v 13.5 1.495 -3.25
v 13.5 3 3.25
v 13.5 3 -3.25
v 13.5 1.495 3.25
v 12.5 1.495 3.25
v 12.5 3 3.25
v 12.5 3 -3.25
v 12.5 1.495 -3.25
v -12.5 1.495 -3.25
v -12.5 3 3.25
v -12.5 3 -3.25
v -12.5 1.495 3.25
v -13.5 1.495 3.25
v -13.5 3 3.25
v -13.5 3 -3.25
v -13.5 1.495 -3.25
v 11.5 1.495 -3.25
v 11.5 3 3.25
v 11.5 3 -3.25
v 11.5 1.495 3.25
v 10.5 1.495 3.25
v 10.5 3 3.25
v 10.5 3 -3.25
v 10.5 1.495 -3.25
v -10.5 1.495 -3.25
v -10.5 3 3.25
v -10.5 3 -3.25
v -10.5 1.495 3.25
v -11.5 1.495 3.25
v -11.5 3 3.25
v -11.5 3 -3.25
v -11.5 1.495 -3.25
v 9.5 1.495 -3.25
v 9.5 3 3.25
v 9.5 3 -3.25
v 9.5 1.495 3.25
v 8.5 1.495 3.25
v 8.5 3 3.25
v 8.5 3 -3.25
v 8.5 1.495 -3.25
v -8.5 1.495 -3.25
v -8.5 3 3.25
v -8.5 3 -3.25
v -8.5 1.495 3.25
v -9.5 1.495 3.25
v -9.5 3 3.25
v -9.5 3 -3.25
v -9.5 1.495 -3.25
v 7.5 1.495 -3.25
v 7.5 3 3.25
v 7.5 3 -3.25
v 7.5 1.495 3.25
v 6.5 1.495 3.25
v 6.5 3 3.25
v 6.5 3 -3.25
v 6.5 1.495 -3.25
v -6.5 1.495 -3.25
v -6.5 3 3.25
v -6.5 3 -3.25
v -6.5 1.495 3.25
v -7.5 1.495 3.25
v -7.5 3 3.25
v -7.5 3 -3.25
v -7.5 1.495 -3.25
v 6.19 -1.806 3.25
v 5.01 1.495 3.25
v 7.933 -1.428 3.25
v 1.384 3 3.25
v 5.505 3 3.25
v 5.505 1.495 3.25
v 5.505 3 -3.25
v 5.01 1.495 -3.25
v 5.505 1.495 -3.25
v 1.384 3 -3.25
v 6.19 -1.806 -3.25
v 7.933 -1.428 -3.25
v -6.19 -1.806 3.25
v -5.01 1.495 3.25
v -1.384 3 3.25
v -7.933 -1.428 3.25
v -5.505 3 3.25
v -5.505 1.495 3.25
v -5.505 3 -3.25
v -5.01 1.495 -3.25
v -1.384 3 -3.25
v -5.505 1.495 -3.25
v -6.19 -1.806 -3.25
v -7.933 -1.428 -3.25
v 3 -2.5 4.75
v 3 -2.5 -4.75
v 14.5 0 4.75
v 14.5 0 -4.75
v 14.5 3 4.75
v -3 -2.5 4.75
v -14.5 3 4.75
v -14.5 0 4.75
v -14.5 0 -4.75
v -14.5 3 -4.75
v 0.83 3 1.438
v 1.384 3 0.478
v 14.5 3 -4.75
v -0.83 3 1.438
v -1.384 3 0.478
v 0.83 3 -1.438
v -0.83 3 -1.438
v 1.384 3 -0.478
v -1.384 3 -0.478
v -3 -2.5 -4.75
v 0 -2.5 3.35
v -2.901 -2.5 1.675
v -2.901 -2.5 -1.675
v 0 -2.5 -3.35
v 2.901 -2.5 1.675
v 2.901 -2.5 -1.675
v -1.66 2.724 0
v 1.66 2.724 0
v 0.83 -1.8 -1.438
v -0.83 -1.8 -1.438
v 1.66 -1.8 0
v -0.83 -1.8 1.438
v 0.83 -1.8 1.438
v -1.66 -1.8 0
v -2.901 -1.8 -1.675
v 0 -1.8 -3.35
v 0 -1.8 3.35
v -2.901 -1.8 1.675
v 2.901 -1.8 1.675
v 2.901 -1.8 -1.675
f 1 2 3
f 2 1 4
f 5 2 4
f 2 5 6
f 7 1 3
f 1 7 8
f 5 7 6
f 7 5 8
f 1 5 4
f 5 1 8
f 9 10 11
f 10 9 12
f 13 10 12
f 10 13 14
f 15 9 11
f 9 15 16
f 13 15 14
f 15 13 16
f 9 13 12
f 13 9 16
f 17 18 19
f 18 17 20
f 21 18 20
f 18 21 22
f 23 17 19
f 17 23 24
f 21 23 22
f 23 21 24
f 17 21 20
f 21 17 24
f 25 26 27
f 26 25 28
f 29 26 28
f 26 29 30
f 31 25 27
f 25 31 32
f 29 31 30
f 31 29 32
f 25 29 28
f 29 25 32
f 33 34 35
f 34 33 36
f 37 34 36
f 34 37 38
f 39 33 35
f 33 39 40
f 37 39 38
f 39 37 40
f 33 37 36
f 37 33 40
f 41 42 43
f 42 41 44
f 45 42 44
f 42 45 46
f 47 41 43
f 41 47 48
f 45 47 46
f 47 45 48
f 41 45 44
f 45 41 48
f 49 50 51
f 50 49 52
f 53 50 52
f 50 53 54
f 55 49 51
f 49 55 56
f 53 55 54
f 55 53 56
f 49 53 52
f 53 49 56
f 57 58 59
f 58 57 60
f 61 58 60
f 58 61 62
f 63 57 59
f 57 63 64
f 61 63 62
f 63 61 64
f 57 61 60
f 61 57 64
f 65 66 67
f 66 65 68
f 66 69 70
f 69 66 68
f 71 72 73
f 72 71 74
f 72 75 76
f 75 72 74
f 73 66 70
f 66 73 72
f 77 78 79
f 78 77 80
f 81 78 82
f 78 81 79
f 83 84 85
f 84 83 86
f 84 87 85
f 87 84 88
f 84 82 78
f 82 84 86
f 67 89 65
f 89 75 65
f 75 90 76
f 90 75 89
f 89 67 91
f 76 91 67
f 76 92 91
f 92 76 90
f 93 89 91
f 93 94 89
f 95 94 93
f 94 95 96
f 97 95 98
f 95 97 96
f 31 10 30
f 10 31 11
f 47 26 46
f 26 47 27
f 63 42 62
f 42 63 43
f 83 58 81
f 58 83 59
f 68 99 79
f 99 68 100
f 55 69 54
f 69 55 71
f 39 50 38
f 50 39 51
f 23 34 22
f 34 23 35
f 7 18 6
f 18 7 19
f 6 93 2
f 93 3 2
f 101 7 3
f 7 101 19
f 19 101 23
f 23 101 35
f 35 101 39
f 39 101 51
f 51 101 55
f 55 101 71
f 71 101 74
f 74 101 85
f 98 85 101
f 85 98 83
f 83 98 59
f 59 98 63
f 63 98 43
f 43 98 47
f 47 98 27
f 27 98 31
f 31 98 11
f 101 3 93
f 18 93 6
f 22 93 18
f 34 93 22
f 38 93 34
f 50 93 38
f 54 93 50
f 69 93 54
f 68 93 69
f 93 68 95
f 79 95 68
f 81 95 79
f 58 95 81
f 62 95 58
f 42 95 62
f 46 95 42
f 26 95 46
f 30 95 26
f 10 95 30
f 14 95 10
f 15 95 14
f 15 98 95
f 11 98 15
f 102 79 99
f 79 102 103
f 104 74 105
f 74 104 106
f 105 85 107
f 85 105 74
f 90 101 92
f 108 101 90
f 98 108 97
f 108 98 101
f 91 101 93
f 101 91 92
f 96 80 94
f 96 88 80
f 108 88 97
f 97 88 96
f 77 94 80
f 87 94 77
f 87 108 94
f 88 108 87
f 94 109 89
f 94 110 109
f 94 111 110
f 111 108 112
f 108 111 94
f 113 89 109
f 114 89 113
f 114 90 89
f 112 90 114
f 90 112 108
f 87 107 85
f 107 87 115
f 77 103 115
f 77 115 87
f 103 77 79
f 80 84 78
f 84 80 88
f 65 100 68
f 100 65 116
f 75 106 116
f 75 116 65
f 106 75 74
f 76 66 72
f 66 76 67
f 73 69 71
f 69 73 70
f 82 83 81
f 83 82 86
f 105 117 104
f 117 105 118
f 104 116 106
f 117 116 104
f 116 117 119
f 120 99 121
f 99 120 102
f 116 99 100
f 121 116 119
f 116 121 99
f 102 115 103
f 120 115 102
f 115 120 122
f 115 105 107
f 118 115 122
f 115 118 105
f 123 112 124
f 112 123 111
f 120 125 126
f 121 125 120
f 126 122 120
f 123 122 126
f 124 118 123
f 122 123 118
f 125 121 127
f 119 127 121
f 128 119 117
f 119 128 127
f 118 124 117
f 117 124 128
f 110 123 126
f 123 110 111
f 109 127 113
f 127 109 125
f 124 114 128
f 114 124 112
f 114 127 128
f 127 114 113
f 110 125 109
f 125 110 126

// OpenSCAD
// Tough Belt Clip
// Design by Marius Gheorghescu, December 2013


// how many teeth on each side
teeth = 5;

// width of the belt in mm incl clearance (use 6.25 for typical GT2 belt)
belt_width = 6.5;

// thickness of the belt in mm (use 1.5 for GT2 belt)
belt_thickness = 1.5;

// belt pitch in mm (use 2.0 for GT2 belt)
pitch = 2.0;

// this controls the strength of the bracket 
shell = 1.5;

/* [Hidden] */
cutout_width = 6 + belt_thickness + shell;
len = 2*teeth*pitch + cutout_width;
round_corner_epsilon = 1;
epsilon = 0.01;


module belt()
{
	// reinforcement
	//cube([len, 2, h], center=true);

	for(i=[pitch/4:pitch:len]) {
		translate([i-len/2, 1.25, 0])
			cube([pitch - round_corner_epsilon, belt_thickness + round_corner_epsilon, belt_width], center=true);

	}

}



module clip() {
difference()  {

	union() {
		// general shape of the clip
		linear_extrude(belt_width + 2*shell, center=true) {
			polygon(points=[
				[len/2,0],
				[3,-2.5], 
				[-3,-2.5], 
				[-len/2,0], 
				[-len/2, shell + belt_thickness], 
				[len/2, shell + belt_thickness]
			]);
		}


		
	}

	// left belt turn
	rotate([0,0,-45])
	translate([-3.2/2 - shell - belt_thickness/2,0,0])
		cube([belt_thickness, 20 + 2*shell, belt_width], center=true);

	// right belt turn
	rotate([0,0,45])
//+ belt_thicknes/2 + shell
	translate([3.2/2 + shell + belt_thickness/2,0,0])
		cube([belt_thickness, 20 + 2*shell, belt_width], center=true);

	// cutouts
	translate([len/2 - teeth*pitch, shell + belt_thickness/2, 0])
		cube([pitch + epsilon, belt_thickness + epsilon, belt_width], center=true);

	translate([-len/2 + teeth*pitch, shell + belt_thickness/2, 0])
		cube([pitch + epsilon, belt_thickness + epsilon, belt_width], center=true);


	// m3 hole
	rotate([90,0,0])
		cylinder(r=1.66, h=10 + 2*shell, center=true);

	// hex nut
	translate([0, -3.8, 0])
	rotate([90,90,0])
		cylinder(r=3.35, h=4, center=true, $fn=6);

	// belt teeth
	for(i=[1:1:teeth]) {

		// left side
		color([1,0, 0])
		translate([len/2 + pitch/4 - i*pitch, shell + belt_thickness/2, 0])
			cube([pitch/2, belt_thickness + epsilon, belt_width], center=true);

		// right side 
		color([1,0, 0])
		translate([-len/2 - pitch/4 + i*pitch, shell + belt_thickness/2, 0])
			cube([pitch/2, belt_thickness + epsilon, belt_width], center=true);
	}

}


}


module clip_set()
{
	for(i=[0:10:50]) {
		translate([0,i,0])
			clip();
	}
}

//clip_set();
clip();
